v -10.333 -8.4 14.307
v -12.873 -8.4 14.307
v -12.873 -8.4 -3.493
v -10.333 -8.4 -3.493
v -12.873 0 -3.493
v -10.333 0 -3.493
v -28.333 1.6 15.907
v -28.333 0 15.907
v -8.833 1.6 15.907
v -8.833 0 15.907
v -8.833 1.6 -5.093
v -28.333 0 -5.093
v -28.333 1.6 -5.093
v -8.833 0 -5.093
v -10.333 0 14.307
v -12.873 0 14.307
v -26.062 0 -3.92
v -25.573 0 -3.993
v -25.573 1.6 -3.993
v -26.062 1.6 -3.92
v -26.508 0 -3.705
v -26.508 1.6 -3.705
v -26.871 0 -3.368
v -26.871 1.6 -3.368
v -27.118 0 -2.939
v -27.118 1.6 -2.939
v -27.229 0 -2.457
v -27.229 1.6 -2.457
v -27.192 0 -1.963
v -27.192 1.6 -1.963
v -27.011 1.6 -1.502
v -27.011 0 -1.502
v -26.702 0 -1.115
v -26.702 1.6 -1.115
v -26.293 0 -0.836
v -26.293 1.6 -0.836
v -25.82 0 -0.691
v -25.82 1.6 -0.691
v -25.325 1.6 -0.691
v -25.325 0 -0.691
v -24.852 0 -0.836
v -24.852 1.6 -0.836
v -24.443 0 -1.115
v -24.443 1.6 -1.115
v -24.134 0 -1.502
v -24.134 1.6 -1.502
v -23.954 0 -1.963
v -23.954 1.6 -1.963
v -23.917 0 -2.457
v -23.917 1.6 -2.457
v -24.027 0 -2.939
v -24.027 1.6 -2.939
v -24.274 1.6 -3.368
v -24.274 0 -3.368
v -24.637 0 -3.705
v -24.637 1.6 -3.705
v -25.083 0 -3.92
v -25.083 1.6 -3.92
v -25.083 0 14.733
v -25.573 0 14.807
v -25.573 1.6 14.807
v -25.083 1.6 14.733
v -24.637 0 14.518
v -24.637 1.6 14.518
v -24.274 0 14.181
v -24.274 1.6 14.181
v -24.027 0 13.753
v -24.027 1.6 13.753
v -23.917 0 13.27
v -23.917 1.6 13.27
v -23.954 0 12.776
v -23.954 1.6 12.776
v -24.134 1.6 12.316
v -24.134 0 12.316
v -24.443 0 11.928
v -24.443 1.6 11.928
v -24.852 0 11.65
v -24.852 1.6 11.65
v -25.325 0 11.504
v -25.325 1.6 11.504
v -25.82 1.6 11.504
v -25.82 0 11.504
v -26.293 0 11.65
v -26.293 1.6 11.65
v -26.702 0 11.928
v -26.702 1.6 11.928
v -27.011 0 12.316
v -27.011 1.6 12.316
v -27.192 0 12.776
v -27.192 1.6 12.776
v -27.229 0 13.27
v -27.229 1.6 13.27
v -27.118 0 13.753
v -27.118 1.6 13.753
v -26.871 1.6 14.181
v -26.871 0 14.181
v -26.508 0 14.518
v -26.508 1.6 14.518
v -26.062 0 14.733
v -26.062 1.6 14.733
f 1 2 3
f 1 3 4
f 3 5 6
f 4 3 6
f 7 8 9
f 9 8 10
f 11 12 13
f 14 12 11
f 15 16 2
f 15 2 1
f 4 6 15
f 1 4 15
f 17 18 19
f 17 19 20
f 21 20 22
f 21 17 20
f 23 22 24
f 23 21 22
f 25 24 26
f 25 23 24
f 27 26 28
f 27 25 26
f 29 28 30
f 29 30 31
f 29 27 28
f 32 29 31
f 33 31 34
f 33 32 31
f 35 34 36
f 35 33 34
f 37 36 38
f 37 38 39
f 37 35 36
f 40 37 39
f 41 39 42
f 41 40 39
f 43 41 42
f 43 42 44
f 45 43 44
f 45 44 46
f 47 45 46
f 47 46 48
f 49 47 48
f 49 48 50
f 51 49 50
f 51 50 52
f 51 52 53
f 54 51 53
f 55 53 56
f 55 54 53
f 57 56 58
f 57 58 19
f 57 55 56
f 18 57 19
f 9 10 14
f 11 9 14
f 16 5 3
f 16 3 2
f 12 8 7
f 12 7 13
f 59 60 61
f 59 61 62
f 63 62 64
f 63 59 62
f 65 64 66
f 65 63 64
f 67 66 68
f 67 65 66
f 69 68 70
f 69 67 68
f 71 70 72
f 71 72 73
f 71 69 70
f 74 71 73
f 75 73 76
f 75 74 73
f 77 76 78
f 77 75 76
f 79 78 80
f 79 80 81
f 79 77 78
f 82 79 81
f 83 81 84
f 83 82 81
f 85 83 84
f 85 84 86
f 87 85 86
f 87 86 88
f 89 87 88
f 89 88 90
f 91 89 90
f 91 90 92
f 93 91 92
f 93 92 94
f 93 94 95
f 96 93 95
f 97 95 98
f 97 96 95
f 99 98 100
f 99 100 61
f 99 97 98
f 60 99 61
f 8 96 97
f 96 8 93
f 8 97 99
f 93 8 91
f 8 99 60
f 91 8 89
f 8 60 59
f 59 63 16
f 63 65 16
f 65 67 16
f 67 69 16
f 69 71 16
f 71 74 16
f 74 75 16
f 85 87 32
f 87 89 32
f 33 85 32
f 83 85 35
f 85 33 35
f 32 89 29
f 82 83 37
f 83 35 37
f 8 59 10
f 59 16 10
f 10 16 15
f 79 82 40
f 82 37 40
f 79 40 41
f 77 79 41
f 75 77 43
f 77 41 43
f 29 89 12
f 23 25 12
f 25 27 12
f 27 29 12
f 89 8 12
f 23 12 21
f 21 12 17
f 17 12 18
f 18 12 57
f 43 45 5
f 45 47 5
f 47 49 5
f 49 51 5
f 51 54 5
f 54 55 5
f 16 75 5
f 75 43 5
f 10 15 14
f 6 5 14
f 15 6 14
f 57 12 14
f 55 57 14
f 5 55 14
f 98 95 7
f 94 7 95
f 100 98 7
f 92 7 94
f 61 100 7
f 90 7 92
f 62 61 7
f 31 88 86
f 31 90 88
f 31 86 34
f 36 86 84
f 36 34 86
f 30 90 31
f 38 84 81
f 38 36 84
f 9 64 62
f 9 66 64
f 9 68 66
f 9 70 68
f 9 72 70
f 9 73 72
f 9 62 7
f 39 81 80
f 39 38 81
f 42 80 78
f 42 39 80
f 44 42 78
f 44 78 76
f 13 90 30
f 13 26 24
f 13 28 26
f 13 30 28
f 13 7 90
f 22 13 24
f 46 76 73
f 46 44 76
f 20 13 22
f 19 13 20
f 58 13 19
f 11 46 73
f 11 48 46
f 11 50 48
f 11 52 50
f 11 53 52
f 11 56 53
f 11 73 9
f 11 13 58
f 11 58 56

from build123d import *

# Parameters (mm, degrees)
SKETCH1_W      = 19.5
SKETCH1_H      = 20.99999991
SKETCH1_R      = 1.660700018
EXTRUDE1_DEPTH = 1.6
SKETCH2_W      = 2.54
SKETCH2_H      = 17.8
EXTRUDE2_DEPTH = 8.4


with BuildPart() as part:
    # Sketch1 → Extrude1 (new body)
    with BuildSketch(Plane(origin=(0, 0, 0), x_dir=(1, 0, 0), z_dir=(0, 1, 0))):
        with Locations((-18.583272271, -5.406568708)):
            Rectangle(SKETCH1_W, SKETCH1_H)
        with Locations(Location((-25.572572253, -13.145868645, 0), (0, 0, 270))):
            Circle(SKETCH1_R, mode=Mode.SUBTRACT)
        with Locations(Location((-25.572572253, 2.332731229, 0), (0, 0, 90))):
            Circle(SKETCH1_R, mode=Mode.SUBTRACT)
    extrude(amount=EXTRUDE1_DEPTH)

    # Sketch2 → Extrude2 (add)
    with BuildSketch(Plane.XZ):
        with Locations((-11.603272271, 5.406568708)):
            Rectangle(SKETCH2_W, SKETCH2_H)
    extrude(amount=EXTRUDE2_DEPTH)


solid = part.part
